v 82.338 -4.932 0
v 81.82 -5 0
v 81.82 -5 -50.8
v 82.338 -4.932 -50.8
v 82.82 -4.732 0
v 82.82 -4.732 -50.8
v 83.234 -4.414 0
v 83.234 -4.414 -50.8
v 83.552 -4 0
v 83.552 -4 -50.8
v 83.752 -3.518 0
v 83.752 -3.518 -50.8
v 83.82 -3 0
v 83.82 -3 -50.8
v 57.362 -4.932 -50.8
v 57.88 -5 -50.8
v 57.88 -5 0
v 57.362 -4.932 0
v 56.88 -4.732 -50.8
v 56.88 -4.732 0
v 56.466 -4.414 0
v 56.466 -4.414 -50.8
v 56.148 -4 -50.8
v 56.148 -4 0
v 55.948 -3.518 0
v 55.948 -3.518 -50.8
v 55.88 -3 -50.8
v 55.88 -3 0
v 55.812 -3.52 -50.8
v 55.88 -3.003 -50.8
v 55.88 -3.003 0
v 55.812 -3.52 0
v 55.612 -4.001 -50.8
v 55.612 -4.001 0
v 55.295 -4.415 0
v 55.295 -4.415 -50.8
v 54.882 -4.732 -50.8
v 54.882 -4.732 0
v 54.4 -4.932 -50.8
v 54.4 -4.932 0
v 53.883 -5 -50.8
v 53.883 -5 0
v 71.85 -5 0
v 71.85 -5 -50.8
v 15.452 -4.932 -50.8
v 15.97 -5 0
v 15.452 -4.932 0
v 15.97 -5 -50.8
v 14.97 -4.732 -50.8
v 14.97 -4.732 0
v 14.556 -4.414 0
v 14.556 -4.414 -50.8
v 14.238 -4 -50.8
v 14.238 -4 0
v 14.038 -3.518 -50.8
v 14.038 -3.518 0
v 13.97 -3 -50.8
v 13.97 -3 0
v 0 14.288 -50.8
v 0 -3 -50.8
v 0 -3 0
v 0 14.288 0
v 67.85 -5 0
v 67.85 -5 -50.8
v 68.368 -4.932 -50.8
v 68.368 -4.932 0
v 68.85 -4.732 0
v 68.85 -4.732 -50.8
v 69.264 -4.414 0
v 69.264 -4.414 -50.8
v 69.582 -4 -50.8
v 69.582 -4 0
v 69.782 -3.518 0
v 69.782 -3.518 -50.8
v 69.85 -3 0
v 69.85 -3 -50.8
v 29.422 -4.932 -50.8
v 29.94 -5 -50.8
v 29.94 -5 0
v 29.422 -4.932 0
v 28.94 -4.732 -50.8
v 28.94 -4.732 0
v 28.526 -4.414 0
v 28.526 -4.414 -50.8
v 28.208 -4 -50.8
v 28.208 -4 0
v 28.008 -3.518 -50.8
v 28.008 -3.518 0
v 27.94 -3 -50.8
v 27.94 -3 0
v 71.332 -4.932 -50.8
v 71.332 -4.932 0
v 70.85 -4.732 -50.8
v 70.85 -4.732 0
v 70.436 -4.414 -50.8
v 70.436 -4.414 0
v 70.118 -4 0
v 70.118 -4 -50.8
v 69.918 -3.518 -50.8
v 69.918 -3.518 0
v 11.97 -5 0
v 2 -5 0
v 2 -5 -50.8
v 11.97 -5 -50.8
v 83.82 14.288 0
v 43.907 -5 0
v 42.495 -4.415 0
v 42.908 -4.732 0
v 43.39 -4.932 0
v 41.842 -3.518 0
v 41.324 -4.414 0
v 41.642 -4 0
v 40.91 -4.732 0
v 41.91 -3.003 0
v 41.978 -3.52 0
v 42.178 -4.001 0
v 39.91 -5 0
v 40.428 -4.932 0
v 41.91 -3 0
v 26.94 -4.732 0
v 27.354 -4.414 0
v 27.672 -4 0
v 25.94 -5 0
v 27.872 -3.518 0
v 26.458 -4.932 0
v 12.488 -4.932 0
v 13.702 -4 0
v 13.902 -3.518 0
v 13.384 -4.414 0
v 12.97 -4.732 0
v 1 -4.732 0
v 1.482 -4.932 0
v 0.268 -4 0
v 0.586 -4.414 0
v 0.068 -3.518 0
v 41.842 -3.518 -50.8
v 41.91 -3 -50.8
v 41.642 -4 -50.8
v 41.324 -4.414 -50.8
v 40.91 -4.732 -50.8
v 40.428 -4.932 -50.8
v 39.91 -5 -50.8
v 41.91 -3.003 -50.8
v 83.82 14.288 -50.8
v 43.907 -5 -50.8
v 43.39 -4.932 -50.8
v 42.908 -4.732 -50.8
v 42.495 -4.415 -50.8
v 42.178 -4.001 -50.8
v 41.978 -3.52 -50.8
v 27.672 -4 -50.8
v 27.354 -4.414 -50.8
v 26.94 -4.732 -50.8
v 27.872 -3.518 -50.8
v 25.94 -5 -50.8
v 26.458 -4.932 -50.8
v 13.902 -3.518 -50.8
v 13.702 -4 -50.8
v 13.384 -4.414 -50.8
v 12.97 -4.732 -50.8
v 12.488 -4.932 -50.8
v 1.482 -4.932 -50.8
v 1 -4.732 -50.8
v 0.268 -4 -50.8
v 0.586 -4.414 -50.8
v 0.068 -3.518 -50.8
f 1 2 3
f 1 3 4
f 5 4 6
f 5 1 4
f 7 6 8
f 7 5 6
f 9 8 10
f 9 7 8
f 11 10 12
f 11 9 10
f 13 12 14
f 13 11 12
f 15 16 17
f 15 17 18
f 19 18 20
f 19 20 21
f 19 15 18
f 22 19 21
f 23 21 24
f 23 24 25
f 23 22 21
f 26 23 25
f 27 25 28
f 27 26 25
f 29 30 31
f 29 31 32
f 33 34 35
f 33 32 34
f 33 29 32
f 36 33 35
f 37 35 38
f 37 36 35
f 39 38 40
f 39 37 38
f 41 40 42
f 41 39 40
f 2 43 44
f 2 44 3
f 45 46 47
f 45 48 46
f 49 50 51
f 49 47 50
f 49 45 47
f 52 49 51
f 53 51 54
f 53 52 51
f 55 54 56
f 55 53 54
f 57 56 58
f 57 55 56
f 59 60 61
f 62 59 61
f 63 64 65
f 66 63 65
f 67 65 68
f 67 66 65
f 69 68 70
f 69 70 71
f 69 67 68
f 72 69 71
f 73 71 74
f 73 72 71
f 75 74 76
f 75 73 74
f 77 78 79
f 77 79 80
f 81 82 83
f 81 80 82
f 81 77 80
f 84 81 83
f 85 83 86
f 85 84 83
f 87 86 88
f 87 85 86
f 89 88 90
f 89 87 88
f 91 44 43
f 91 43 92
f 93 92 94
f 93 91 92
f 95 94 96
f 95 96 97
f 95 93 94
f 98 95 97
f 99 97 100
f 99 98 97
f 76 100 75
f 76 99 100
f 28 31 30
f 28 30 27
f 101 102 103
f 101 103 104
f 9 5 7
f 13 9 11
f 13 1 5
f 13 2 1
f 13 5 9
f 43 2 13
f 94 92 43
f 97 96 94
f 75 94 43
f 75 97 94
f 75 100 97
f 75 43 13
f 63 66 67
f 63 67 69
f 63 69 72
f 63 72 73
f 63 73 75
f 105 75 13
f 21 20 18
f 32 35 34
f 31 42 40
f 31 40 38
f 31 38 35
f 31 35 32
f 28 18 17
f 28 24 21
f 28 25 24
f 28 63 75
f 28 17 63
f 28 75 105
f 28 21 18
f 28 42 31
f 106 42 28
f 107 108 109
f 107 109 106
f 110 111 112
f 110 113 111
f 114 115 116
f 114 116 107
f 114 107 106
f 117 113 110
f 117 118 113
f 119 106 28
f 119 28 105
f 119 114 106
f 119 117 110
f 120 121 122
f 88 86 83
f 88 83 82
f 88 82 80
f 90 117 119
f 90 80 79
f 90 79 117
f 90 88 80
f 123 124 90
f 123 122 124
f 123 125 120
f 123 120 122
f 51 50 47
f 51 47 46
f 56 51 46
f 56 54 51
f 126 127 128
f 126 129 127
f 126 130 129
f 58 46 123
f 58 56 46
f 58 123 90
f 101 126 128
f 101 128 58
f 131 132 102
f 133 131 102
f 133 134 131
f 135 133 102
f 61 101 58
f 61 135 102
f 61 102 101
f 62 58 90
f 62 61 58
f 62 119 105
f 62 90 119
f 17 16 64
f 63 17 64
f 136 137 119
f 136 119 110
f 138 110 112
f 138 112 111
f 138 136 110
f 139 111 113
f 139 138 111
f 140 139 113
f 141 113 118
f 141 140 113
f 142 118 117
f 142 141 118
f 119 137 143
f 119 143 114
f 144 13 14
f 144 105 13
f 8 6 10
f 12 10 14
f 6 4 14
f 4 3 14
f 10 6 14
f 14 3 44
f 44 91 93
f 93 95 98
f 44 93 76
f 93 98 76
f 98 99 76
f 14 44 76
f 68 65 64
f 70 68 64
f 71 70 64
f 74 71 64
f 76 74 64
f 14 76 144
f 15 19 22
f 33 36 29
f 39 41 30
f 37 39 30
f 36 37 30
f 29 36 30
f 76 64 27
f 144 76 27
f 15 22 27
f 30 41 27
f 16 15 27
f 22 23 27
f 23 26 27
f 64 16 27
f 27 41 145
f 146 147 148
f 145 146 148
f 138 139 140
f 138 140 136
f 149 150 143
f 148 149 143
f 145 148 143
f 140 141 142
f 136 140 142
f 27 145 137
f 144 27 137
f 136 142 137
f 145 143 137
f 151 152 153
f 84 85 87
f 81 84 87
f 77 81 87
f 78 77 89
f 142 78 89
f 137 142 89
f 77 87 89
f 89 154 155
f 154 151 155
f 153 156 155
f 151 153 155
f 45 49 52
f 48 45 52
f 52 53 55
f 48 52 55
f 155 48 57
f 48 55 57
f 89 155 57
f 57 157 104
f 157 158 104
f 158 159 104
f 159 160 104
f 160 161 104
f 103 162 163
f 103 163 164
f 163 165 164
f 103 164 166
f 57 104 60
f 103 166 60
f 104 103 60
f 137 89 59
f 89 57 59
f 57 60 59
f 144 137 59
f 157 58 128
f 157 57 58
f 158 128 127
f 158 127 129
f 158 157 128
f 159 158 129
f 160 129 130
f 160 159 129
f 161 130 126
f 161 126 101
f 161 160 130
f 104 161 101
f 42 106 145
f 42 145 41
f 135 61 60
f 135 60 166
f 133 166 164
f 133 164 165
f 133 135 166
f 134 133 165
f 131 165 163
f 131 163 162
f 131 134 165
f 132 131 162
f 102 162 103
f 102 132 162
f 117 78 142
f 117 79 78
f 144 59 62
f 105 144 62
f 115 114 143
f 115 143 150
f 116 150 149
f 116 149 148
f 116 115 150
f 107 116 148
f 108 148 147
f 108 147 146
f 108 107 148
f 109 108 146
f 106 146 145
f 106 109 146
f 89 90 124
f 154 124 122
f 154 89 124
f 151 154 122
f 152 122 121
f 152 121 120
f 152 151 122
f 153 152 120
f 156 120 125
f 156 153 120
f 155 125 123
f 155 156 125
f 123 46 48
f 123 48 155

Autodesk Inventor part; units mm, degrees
ref_plane "YZ Plane" through (0, 0, 0) normal (1, 0, 0) x (0, 1, 0)
ref_plane "XZ Plane" through (0, 0, 0) normal (0, 1, 0) x (-1, 0, 0)
ref_plane "XY Plane" through (0, 0, 0) normal (0, 0, 1) x (1, 0, 0)
sketch "Sketch1" plane through (0, 0, 0) normal (0, 1, 0) x (-1, 0, 0)
  line L0 (0, 0) -> (-69.85, 0)
  line L1 (-69.85, 0) -> (-69.85, -50.8)
  line L2 (-69.85, -50.8) -> (0, -50.8)
  line L3 (0, -50.8) -> (0, 0)
  dimension "d0" = 50.8
  dimension "d1" = 69.85
extrude "Extrusion1" add sketch "Sketch1" along normal blind 28.575
sketch "Sketch2" plane through (0, 28.575, 0) normal (0, 1, 0) x (1, 0, 0)
  line L0 (0, 0) -> (69.85, 0) projected
  line L1 (13.97, 0) -> (13.97, 50.8)
  line L2 (69.85, 50.8) -> (0, 50.8) projected
  line L3 (27.94, 50.8) -> (27.94, 0)
  line L4 (55.88, 50.8) -> (55.88, 0)
  line L5 (41.91, 50.8) -> (41.91, 0)
  line L6 (0, 50.8) -> (0, 0) projected
  dimension "d4" = 13.97
  dimension "d5" = 13.97
  dimension "d6" = 13.97
  dimension "d7" = 13.97
sketch "Sketch3" plane through (0, 28.575, 0) normal (0, 1, 0) x (1, 0, 0)
  line L0 (69.85, 50.8) -> (0, 50.8) projected
  line L1 (0, 0) -> (69.85, 0) projected
  line L2 (0, 50.8) -> (13.97, 50.8)
  line L3 (13.97, 50.8) -> (13.97, 0)
  line L4 (13.97, 0) -> (0, 0)
  line L5 (0, 0) -> (0, 50.8)
  dimension "d8" = 50.8
  dimension "d9" = 13.97
extrude "Extrusion2" add sketch "Sketch2" along normal blind 5 contours L6 L2 L1 L0
sketch "Sketch4" plane through (0, 0, -50.8) normal (-1, 0, 0) x (0, 0, 1)
  line L0 (0, 0) -> (0, 33.575) projected
  line L1 (50.8, 0) -> (50.8, 33.575) projected
  line L2 (0, 33.575) -> (50.8, 33.575)
  line L3 (50.8, 33.575) -> (50.8, 28.5663)
  line L4 (50.8, 28.5663) -> (0, 28.5663)
  line L5 (0, 28.5663) -> (0, 33.575)
fillet "Fillet1" radius 2 2 edges at (0, 33.575, -25.4) (13.97, 33.575, -25.4)
sketch "Sketch5" plane through (0, 28.575, 0) normal (0, 1, 0) x (1, 0, 0)
  line L0 (13.97, 50.8) -> (27.94, 50.8)
  line L1 (27.94, 50.8) -> (27.94, 0)
  line L2 (27.94, 0) -> (13.97, 0)
  line L3 (13.97, 0) -> (13.97, 50.8)
  point P0 (0, 0)
  dimension "d13" = 13.97
extrude "Extrusion3" add sketch "Sketch5" along normal blind 5
fillet "Fillet2" radius 2 2 edges at (13.97, 33.575, -25.4) (27.94, 33.575, -25.4)
sketch "Sketch6" plane through (0, 28.575, 0) normal (0, 1, 0) x (1, 0, 0)
  line L0 (27.94, 50.8) -> (27.94, 0) projected
  line L1 (27.94, 50.8) -> (41.91, 50.8)
  line L2 (41.91, 50.8) -> (41.91, 0)
  line L3 (41.91, 0) -> (27.94, 0)
  line L4 (27.94, 0) -> (27.94, 50.8)
  point P0 (0, 0)
  dimension "d17" = 13.97
extrude "Extrusion4" add sketch "Sketch6" along normal blind 5
fillet "Fillet3" radius 2 2 edges at (27.94, 33.575, -25.4) (41.91, 33.575, -25.4)
sketch "Sketch7" plane through (0, 28.575, 0) normal (0, 1, 0) x (1, 0, 0)
  line L0 (41.91, 0) -> (41.91, 50.8) projected
  line L1 (41.91, 0) -> (69.85, 0) projected
  line L2 (41.91, 50.8) -> (55.88, 50.8)
  line L3 (55.88, 50.8) -> (55.88, 0)
  line L4 (55.88, 0) -> (41.91, 0)
  line L5 (41.91, 0) -> (41.91, 50.8)
  point P0 (0, 0)
extrude "Extrusion5" add sketch "Sketch7" along normal blind 5
fillet "Fillet4" radius 2 2 edges at (41.91, 33.575, -25.4) (55.88, 33.575, -25.4)
sketch "Sketch8" plane through (0, 28.575, 0) normal (0, 1, 0) x (1, 0, 0)
  line L0 (55.88, 50.8) -> (55.88, 0) projected
  line L1 (55.88, 0) -> (69.85, 0) projected
  line L2 (55.88, 50.8) -> (69.85, 50.8)
  line L3 (69.85, 50.8) -> (69.85, 0)
  line L4 (69.85, 0) -> (55.88, 0)
  line L5 (55.88, 0) -> (55.88, 50.8)
  point P0 (0, 0)
extrude "Extrusion6" add sketch "Sketch8" along normal blind 5
fillet "Fillet5" radius 2 2 edges at (55.88, 33.575, -25.4) (69.85, 33.575, -25.4)
sketch "Sketch9" plane through (0, 0, 0) normal (0, -1, 0) x (1, 0, 0)
  point P0 (0, 0)
sketch "Sketch10" plane through (0, 0, 0) normal (0, -1, 0) x (1, 0, 0)
  line L0 (69.85, -50.8) -> (0, -50.8) projected
  line L1 (0, 0) -> (13.97, 0)
  line L2 (13.97, 0) -> (13.97, -50.8)
  line L3 (13.97, -50.8) -> (0, -50.8)
  line L4 (0, -50.8) -> (0, 0)
  dimension "d27" = 13.97
extrude "Extrusion7" add sketch "Sketch10" along normal blind 5
fillet "Fillet6" radius 2 2 edges at (0, -5, -25.4) (13.97, -5, -25.4)
sketch "Sketch11" plane through (0, 0, 0) normal (0, -1, 0) x (1, 0, 0)
  line L0 (13.97, 0) -> (13.97, -50.8) projected
  line L1 (27.94, -50.8) -> (25.94, -50.8) projected
  line L2 (13.97, 0) -> (27.94, 0)
  line L3 (27.94, 0) -> (27.94, -50.8)
  line L4 (27.94, -50.8) -> (13.97, -50.8)
  line L5 (13.97, -50.8) -> (13.97, 0)
  point P0 (0, 0)
extrude "Extrusion8" add sketch "Sketch11" along normal blind 5
fillet "Fillet7" radius 2 2 edges at (13.97, -5, -25.4) (27.94, -5, -25.4)
sketch "Sketch12" plane through (0, 0, 0) normal (0, -1, 0) x (1, 0, 0)
  line L0 (27.94, 0) -> (27.94, -50.8) projected
  line L1 (41.91, 0) -> (41.91, -50.8) projected
  line L2 (27.94, 0) -> (41.91, 0)
  line L3 (41.91, 0) -> (41.91, -50.8)
  line L4 (41.91, -50.8) -> (27.94, -50.8)
  line L5 (27.94, -50.8) -> (27.94, 0)
  point P0 (0, 0)
extrude "Extrusion9" add sketch "Sketch12" along normal blind 5
fillet "Fillet8" radius 2 2 edges at (27.94, -5, -25.4) (41.91, -5, -25.4)
sketch "Sketch13" plane through (0, 0, 0) normal (0, -1, 0) x (1, 0, 0)
  line L0 (41.91, -50.8) -> (41.91, 0) projected
  line L1 (69.85, -50.8) -> (41.91, -50.8) projected
  line L2 (41.91, 0) -> (55.88, 0)
  line L3 (55.88, 0) -> (55.88, -50.8)
  line L4 (55.88, -50.8) -> (41.91, -50.8)
  line L5 (41.91, -50.8) -> (41.91, 0)
  point P0 (0, 0)
extrude "Extrusion10" add sketch "Sketch13" along normal blind 5
fillet "Fillet9" radius 2 2 edges at (55.88, -5, -25.4) (41.91, -5, -25.4)
sketch "Sketch14" plane through (0, 0, 0) normal (0, -1, 0) x (1, 0, 0)
  line L0 (53.88, 0) -> (55.88, 0) projected
  line L1 (69.85, -50.8) -> (55.88, -50.8) projected
  line L2 (55.88, 0) -> (69.85, 0)
  line L3 (69.85, 0) -> (69.85, -50.8)
  line L4 (69.85, -50.8) -> (55.88, -50.8)
  line L5 (55.88, -50.8) -> (55.88, 0)
  point P0 (0, 0)
extrude "Extrusion11" add sketch "Sketch14" along normal blind 5
fillet "Fillet10" radius 2 2 edges at (55.88, -5, -25.4) (69.85, -5, -25.4)
sketch "Sketch15" plane through (2, 33.575, 0) normal (0, 0, 1) x (1, 0, 0)
  line L0 (-2, -2) -> (-2, -36.575) projected
  line L1 (-2, -19.2875) -> (67.85, -19.2875)
  line L2 (67.85, -36.575) -> (67.85, -2) projected
  line L3 (-2, -19.2875) -> (-2, 10.3755)
  line L4 (-2, 10.3755) -> (71.5202, 10.3755)
  line L5 (71.5202, 10.3755) -> (67.85, -19.2875)
  point P0 (-2, -33.575)
extrude "Extrusion12" cut sketch "Sketch15" against normal through all
sketch "Sketch16" plane through (69.85, -3, 0) normal (1, 0, 0) x (0, 0, -1)
  line L0 (50.8, 17.2875) -> (0, 17.2875) projected
  line L1 (0, 0) -> (0, 17.2875) projected
  line L2 (50.8, 0) -> (0, 0) projected
  line L3 (50.8, 0) -> (50.8, 17.2875) projected
  point P0 (0, 3)
extrude "Extrusion13" add sketch "Sketch16" along normal blind 13.97
ref_plane "Work Plane1" through (69.85, -3, 0) normal (1, 0, 0) x (0, 0, -1)
mirror "Mirror1" about plane through (69.85, -3, 0) normal (1, 0, 0) of "Fillet10", "Extrusion11"
properties part number "Battery"
